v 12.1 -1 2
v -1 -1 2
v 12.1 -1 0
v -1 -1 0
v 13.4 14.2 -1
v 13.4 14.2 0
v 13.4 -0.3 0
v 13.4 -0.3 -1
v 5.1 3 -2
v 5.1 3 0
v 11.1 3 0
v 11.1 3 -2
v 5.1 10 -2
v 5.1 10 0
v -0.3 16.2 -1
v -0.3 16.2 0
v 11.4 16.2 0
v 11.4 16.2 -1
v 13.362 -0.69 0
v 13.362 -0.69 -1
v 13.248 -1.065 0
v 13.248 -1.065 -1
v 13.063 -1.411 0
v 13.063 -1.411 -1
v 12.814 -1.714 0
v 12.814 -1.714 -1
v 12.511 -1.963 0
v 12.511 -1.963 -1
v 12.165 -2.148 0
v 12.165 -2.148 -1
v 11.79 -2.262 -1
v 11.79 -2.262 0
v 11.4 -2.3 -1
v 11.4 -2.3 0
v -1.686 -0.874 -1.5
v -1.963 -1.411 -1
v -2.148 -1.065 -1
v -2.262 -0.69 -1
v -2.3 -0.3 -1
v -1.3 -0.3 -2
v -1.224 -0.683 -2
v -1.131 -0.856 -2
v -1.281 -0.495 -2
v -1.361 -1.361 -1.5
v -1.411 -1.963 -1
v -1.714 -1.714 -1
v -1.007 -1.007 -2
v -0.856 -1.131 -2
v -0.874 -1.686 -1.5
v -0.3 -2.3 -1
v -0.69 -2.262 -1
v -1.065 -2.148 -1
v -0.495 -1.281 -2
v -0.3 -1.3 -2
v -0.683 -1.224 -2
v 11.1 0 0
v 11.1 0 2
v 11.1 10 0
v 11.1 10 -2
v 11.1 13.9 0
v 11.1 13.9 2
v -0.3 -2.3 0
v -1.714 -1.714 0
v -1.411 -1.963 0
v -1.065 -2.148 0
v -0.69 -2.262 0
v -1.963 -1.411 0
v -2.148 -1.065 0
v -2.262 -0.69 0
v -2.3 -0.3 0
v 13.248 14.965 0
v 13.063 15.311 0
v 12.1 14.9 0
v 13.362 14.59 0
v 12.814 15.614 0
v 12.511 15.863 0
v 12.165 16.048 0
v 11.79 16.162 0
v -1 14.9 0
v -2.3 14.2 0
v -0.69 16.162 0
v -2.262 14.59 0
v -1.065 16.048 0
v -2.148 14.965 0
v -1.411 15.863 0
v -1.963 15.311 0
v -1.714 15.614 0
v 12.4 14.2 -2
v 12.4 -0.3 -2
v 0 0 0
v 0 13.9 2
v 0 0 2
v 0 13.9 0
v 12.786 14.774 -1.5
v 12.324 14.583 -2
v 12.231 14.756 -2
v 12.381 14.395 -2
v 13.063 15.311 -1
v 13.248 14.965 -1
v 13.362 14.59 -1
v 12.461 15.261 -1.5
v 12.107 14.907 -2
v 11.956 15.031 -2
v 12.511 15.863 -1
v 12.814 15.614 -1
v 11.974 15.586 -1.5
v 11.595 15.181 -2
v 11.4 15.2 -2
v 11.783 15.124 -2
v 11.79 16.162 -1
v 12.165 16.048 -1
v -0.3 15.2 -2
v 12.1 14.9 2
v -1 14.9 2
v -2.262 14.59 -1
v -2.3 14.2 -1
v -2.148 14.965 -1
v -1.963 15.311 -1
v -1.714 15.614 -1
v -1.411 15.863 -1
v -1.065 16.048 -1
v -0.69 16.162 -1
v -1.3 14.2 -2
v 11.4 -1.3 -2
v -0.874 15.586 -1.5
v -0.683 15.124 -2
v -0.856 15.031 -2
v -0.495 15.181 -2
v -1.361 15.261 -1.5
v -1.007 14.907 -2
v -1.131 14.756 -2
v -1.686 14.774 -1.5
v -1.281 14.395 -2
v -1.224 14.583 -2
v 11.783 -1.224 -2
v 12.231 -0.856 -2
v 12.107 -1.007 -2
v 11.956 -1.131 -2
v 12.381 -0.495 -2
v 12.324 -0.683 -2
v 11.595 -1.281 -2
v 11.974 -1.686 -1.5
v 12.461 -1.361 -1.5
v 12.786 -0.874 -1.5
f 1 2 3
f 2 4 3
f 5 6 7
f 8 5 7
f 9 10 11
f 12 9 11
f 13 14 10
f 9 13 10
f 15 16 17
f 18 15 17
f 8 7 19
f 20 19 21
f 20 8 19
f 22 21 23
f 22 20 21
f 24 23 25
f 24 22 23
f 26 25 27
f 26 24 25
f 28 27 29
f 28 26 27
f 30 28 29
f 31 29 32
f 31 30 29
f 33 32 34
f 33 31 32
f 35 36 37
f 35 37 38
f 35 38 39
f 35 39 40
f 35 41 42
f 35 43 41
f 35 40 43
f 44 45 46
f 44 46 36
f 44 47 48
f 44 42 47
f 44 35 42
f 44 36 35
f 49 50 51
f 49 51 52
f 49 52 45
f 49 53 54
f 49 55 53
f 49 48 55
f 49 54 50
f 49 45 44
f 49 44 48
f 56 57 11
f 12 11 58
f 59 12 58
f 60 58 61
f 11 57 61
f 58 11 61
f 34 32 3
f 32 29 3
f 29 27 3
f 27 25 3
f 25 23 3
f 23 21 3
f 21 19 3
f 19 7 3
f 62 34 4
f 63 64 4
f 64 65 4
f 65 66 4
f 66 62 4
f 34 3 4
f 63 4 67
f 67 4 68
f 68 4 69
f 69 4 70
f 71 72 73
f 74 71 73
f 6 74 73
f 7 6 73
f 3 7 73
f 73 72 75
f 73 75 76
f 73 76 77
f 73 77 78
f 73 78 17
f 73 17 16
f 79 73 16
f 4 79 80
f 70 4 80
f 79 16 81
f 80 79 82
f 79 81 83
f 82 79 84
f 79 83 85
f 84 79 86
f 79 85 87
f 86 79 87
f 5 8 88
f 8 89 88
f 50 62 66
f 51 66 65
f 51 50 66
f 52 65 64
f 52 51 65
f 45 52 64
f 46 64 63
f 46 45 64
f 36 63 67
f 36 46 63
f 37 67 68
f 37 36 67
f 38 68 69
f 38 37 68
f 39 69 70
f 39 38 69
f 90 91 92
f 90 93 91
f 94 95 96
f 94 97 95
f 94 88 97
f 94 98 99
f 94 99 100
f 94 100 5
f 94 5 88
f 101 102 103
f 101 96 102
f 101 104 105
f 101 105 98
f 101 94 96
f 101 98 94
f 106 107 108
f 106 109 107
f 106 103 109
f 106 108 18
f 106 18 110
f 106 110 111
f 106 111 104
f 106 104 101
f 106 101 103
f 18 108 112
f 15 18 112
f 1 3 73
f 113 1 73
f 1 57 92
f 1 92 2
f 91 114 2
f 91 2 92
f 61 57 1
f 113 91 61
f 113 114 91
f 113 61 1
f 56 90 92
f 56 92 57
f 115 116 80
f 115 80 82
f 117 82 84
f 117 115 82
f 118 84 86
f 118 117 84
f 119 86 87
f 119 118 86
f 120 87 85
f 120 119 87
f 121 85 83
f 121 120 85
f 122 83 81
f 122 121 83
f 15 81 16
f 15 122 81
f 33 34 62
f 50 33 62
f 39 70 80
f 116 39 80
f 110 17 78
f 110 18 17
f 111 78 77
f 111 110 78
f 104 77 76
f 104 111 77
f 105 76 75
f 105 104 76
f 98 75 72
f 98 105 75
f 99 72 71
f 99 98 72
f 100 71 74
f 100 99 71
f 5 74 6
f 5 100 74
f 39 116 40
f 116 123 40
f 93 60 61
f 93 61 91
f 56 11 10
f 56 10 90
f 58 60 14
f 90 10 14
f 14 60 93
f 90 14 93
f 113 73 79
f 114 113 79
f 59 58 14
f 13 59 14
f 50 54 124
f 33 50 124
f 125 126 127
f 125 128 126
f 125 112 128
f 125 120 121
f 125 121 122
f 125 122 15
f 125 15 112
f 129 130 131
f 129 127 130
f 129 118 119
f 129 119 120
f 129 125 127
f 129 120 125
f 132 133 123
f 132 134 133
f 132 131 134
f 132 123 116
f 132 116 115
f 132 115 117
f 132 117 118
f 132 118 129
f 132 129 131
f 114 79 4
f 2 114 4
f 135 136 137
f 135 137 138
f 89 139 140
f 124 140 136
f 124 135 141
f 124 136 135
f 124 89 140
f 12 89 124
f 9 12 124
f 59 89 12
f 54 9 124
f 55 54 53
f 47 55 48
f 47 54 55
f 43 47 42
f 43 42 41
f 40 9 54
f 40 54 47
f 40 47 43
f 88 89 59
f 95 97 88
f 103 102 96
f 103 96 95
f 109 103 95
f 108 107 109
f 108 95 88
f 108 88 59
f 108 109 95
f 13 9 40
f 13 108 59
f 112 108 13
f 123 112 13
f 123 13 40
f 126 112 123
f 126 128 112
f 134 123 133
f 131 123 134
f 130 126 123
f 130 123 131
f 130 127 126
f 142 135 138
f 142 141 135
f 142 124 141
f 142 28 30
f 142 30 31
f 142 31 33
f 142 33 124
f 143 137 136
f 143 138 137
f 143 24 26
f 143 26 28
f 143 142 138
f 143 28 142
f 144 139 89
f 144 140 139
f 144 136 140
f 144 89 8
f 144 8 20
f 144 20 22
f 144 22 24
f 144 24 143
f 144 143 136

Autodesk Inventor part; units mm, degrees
ref_plane "YZ Plane" through (0, 0, 0) normal (1, 0, 0) x (0, 1, 0)
ref_plane "XZ Plane" through (0, 0, 0) normal (0, 1, 0) x (-1, 0, 0)
ref_plane "XY Plane" through (0, 0, 0) normal (0, 0, 1) x (1, 0, 0)
sketch "Sketch1" plane through (0, 0, 0) normal (0, 0, 1) x (1, 0, 0)
  point P0 (0, 0)
sketch "Sketch2" plane through (0, 0, 0) normal (0, 0, 1) x (1, 0, 0)
  point P0 (0, 0)
sketch "Sketch3" plane through (0, 0, 0) normal (0, 0, 1) x (1, 0, 0)
  line L0 (0, 0) -> (11.1, 0)
  line L1 (11.1, 0) -> (11.1, 13.9)
  line L2 (11.1, 13.9) -> (0, 13.9)
  line L3 (0, 13.9) -> (0, 0)
  line L4 (-1, -1) -> (12.1, -1)
  line L5 (12.1, -1) -> (12.1, 14.9)
  line L6 (12.1, 14.9) -> (-1, 14.9)
  line L7 (-1, 14.9) -> (-1, -1)
  dimension "d0" = 13.9
  dimension "d1" = 11.1
  dimension "d7" = 1
extrude "Extrusion1" add sketch "Sketch3" along normal blind 2
sketch "Sketch5" plane through (0, 0, 0) normal (0, 0, -1) x (-1, 0, 0)
  line L0 (-12.1, 14.9) -> (1, 14.9) projected
  line L1 (-12.1, -1) -> (-12.1, 14.9) projected
  line L2 (1, 14.9) -> (1, -1) projected
  line L3 (1, -1) -> (-12.1, -1) projected
  line L4 (2.3, 16.2) -> (-13.4, 16.2)
  line L5 (-13.4, 16.2) -> (-13.4, -2.3)
  line L6 (-13.4, -2.3) -> (2.3, -2.3)
  line L7 (2.3, -2.3) -> (2.3, 16.2)
  point P0 (0, 0)
  dimension "d8" = 1.3
extrude "Extrusion2" add sketch "Sketch5" along normal blind 2 contours L0 L2 L3 L1 | L7 L6 L5 L4
sketch "Sketch7" plane through (0, 0, 0) normal (0, 0, 1) x (1, 0, 0)
  line L0 (5.1, 3) -> (11.1, 3)
  line L1 (11.1, 3) -> (11.1, 10)
  line L2 (11.1, 10) -> (5.1, 10)
  line L3 (5.1, 10) -> (5.1, 3)
  line L4 (0, 0) -> (0, 13.9) projected
  line L5 (11.1, 0) -> (0, 0) projected
  line L6 (11.1, 13.9) -> (11.1, 0) projected
  dimension "d16" = 7
  dimension "d17" = 6
  dimension "d22" = 3
  dimension "d23" = 0
extrude "Extrusion4" cut sketch "Sketch7" against normal blind 2
fillet "Fillet1" radius 2 4 edges at (13.4, 16.2, -1) (-2.3, 16.2, -1) (13.4, -2.3, -1) (-2.3, -2.3, -1)
chamfer "Chamfer1" distance 1 angle 45 8 edges at (5.55, 16.2, -2) (12.8142, 15.6142, -2) (13.4, 6.95, -2) (12.8142, -1.7142, -2) (5.55, -2.3, -2) (-1.7142, -1.7142, -2) (-2.3, 6.95, -2) (-1.7142, 15.6142, -2)
properties part number "VL53L0X_cover_2"
